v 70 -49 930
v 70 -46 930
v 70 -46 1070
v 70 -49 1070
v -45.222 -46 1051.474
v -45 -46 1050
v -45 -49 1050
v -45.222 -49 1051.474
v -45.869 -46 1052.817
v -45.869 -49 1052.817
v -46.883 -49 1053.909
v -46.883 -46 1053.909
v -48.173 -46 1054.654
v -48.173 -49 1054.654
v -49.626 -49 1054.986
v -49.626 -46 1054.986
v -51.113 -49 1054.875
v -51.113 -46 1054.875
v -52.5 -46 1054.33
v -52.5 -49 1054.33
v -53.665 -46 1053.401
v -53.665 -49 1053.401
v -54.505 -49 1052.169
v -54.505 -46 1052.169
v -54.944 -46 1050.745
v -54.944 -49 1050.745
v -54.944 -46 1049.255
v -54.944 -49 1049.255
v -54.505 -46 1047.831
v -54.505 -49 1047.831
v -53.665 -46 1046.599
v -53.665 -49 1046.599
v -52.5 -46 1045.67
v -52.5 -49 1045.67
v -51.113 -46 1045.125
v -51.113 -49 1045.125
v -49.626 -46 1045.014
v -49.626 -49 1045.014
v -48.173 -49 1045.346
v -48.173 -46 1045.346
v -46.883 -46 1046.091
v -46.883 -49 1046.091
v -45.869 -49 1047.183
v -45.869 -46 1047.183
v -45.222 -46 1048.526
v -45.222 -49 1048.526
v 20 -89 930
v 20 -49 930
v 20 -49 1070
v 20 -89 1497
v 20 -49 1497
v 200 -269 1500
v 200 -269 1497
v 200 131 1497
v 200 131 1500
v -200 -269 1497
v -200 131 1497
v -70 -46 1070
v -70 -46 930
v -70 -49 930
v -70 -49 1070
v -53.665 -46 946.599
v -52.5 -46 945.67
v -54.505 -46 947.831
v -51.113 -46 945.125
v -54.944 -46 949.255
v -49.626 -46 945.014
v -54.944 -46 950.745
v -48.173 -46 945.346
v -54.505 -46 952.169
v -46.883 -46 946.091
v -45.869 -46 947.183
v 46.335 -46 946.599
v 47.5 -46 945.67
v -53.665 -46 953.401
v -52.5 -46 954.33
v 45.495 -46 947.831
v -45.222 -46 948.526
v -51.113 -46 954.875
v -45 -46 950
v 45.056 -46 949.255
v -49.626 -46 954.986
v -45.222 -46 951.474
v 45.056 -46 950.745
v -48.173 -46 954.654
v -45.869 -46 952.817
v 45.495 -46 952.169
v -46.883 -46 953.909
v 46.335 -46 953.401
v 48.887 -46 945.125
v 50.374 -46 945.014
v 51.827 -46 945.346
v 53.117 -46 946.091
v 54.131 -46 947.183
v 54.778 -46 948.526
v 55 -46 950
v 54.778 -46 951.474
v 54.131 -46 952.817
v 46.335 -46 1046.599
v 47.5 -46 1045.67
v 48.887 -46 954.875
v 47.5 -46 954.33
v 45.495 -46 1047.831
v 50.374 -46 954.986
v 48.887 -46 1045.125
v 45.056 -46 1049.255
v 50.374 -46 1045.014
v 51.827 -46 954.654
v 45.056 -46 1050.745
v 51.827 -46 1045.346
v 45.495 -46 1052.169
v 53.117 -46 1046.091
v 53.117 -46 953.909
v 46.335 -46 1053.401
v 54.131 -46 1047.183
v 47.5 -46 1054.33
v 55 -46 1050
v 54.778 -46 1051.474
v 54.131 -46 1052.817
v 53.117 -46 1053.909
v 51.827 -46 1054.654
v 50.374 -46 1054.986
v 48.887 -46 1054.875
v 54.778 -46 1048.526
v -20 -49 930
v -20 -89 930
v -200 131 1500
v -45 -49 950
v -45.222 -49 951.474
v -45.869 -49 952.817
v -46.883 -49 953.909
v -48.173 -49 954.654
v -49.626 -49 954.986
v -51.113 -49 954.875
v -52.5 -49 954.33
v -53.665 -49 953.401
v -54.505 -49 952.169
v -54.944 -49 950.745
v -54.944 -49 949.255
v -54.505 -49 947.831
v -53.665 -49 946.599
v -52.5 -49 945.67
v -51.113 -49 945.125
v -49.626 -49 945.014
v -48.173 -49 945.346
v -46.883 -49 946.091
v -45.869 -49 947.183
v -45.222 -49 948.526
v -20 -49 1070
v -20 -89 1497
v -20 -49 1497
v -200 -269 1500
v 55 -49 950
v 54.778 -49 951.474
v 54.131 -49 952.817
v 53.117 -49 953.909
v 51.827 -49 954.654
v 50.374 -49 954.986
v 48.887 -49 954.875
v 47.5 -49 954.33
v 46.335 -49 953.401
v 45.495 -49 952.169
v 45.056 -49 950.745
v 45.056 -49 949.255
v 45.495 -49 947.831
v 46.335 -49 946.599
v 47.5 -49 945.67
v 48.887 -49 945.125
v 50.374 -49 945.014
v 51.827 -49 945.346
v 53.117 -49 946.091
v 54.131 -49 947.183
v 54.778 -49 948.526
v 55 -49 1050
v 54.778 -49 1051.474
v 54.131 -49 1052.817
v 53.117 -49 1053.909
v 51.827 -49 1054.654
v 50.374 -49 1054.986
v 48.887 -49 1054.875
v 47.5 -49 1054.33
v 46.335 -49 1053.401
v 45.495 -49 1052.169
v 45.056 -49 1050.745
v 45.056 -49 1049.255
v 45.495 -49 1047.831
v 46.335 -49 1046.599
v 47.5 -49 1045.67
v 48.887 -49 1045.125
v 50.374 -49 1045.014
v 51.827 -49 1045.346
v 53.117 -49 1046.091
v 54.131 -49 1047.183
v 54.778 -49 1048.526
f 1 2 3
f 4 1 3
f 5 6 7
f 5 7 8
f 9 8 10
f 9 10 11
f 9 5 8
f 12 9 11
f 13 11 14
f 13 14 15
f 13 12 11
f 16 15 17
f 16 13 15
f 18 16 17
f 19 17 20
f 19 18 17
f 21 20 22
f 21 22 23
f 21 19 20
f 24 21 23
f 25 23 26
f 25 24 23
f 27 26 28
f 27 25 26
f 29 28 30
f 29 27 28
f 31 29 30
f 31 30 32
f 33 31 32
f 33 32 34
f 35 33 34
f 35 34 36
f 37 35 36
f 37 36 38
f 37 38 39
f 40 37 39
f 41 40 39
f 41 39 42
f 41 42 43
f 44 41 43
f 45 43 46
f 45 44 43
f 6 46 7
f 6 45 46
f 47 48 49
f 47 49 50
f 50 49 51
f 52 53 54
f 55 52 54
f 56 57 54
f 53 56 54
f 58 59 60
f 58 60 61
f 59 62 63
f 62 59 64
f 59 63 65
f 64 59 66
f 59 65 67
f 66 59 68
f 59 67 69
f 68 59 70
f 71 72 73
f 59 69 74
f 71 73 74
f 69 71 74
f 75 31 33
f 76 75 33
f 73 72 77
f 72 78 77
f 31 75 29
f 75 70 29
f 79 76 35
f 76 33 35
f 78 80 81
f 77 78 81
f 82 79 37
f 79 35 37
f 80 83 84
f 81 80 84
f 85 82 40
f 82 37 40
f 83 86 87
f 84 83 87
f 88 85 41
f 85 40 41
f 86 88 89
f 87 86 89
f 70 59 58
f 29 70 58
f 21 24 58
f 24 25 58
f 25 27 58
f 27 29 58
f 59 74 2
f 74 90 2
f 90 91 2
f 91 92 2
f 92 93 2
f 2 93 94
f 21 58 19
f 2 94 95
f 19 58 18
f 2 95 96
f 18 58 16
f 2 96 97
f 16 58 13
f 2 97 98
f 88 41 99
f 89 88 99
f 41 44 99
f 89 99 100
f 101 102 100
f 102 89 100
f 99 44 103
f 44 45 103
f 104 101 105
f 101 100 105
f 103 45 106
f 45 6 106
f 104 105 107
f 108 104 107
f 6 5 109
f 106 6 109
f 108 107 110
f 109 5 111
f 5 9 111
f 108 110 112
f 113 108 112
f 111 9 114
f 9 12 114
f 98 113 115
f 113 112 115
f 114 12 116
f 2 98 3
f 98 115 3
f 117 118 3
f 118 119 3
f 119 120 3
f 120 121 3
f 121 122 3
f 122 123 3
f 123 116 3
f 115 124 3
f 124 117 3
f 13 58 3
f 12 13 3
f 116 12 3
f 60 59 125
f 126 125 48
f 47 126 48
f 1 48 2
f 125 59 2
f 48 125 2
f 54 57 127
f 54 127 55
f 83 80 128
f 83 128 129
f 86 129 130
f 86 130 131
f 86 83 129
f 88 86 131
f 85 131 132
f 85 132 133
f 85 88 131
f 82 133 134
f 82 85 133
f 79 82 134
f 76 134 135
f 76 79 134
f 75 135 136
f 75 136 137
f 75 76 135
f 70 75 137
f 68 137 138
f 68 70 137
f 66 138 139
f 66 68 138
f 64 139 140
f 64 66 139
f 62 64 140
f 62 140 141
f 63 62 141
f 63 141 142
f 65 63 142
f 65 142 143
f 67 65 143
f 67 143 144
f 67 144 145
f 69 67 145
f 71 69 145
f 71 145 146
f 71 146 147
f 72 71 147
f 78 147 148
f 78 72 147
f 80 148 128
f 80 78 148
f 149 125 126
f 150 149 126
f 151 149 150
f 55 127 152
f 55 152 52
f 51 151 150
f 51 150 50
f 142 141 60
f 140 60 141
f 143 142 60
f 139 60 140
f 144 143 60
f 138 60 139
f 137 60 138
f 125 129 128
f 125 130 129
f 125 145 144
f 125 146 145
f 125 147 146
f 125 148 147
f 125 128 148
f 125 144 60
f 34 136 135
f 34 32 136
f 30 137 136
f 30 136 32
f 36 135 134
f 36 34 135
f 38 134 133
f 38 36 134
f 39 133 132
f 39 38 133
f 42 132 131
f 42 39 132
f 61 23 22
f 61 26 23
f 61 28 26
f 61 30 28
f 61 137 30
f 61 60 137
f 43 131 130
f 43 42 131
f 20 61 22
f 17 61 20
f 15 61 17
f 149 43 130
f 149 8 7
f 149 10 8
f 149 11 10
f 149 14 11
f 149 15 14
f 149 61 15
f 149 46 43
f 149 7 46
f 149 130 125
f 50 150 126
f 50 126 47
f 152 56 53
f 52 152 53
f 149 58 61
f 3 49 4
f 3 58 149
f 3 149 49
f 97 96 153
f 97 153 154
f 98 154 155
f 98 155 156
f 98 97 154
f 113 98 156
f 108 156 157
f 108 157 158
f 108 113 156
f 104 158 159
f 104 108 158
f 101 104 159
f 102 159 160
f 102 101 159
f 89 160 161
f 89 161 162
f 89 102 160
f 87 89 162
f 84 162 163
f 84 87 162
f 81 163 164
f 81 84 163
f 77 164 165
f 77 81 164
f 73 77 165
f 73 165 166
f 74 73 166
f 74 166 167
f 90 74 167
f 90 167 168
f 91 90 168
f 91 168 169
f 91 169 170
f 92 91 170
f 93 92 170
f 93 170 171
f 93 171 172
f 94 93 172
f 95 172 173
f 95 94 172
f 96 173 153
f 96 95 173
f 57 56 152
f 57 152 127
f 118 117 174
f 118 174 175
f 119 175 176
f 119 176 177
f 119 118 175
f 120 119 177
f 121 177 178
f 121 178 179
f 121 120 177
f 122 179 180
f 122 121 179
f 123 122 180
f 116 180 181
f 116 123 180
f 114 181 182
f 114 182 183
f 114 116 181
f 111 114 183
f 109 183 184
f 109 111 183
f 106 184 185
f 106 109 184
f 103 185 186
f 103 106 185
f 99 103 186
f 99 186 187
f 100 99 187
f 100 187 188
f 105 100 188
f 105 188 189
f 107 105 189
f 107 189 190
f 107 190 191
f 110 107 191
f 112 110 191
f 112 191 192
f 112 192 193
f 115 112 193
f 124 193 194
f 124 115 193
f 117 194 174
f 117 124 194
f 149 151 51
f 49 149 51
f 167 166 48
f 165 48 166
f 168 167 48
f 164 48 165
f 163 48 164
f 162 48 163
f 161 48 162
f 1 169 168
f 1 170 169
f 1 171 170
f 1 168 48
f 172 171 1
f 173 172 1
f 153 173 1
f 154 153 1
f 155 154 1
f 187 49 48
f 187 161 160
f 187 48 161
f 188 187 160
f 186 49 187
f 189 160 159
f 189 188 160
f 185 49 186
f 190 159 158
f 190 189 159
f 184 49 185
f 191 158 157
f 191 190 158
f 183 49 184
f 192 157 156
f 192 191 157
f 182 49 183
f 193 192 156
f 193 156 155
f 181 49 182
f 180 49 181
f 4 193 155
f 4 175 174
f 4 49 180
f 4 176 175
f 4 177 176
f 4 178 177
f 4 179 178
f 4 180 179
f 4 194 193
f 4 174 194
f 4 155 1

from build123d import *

# Parameters (mm, degrees)
F1_W     = 140
F1_H     = 140
F1_R     = 5
F2_DEPTH = 3
F3_W     = 40
F3_H     = 567
F4_DEPTH = 40
F5_W     = 400
F5_H     = 400
F6_DEPTH = 3


with BuildPart() as f2:
    # F1 (on offset) → F2 (new body)
    with BuildSketch(Plane.XZ.offset(46)):
        with Locations((0, 1000)):
            Rectangle(F1_W, F1_H)
        with Locations((-50, 950)):
            Circle(F1_R, mode=Mode.SUBTRACT)
        with Locations((50, 950)):
            Circle(F1_R, mode=Mode.SUBTRACT)
        with Locations((-50, 1050)):
            Circle(F1_R, mode=Mode.SUBTRACT)
        with Locations((50, 1050)):
            Circle(F1_R, mode=Mode.SUBTRACT)
    extrude(amount=F2_DEPTH)

    # F3 (on face) → F4 (join)
    with BuildSketch(Plane.XZ.offset(49)):
        with Locations((0, 1213.5)):
            Rectangle(F3_W, F3_H)
    extrude(amount=F4_DEPTH)


with BuildPart() as f6:
    # F5 (on face) → F6 (new body)
    with BuildSketch(Plane.XY.offset(1497)):
        with Locations((0, -69)):
            Rectangle(F5_W, F5_H)
    extrude(amount=F6_DEPTH)


solid = Compound([f2.part, f6.part])
